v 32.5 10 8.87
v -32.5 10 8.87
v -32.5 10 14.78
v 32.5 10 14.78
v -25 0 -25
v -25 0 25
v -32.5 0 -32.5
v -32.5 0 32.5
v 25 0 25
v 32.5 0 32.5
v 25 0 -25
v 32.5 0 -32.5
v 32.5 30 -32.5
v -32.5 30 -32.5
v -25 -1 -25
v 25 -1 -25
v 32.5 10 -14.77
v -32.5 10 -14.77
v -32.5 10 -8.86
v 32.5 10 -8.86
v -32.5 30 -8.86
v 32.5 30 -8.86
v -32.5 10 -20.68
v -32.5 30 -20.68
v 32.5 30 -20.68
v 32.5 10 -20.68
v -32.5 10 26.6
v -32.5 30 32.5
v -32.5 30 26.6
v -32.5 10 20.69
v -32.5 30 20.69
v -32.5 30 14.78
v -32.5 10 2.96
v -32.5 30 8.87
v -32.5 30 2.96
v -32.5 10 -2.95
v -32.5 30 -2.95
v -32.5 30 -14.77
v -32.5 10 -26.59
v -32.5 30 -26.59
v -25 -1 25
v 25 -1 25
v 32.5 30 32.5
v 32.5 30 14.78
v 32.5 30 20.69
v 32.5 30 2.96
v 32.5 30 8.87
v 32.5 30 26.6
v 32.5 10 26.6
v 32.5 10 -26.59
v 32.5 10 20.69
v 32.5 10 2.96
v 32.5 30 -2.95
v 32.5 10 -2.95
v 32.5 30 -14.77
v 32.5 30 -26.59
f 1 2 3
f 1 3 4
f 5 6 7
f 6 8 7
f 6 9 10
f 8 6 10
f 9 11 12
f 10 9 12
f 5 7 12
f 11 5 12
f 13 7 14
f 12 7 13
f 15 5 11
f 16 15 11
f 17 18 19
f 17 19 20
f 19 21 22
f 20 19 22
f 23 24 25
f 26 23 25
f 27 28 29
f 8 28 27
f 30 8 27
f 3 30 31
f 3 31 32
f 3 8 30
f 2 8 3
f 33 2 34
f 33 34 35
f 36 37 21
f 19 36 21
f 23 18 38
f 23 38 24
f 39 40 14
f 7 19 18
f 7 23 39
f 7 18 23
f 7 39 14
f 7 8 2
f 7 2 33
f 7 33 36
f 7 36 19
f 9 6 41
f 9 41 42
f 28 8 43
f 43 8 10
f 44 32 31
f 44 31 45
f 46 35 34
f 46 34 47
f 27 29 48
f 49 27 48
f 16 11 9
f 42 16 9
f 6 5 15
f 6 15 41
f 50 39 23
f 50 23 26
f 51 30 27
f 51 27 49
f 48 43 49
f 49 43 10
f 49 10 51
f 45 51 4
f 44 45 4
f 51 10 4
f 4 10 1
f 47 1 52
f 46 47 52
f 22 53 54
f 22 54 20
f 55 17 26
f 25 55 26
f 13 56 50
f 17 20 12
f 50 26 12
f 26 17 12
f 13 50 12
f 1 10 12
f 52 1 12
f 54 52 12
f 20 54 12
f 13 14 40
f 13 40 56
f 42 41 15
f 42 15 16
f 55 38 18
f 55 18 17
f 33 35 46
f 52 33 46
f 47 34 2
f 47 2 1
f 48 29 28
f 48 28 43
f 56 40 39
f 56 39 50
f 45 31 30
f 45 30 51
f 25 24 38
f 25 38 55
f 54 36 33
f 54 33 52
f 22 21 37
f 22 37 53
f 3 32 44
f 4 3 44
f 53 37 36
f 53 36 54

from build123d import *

# Parameters (mm, degrees)
SKETCH1_W      = 65
SKETCH1_H      = 65
EXTRUDE1_DEPTH = 30
SKETCH2_W      = 65
SKETCH2_H      = 5.91
EXTRUDE2_DEPTH = 20
SKETCH3_W      = 50
SKETCH3_H      = 50
EXTRUDE3_DEPTH = 1


with BuildPart() as part:
    # Sketch1 → Extrude1 (new body)
    with BuildSketch(Plane(origin=(0, 0, 0), x_dir=(1, 0, 0), z_dir=(0, 1, 0))):
        Rectangle(SKETCH1_W, SKETCH1_H)
    extrude(amount=EXTRUDE1_DEPTH)

    # Sketch2 → Extrude2 (cut)
    with BuildSketch(Plane(origin=(0, 30, 0), x_dir=(1, 0, 0), z_dir=(0, 1, 0))):
        with Locations((0, 23.635)):
            Rectangle(SKETCH2_W, SKETCH2_H)
        with Locations((0, 11.815)):
            Rectangle(SKETCH2_W, SKETCH2_H)
        with Locations((0, -0.005)):
            Rectangle(SKETCH2_W, SKETCH2_H)
        with Locations((0, -11.825)):
            Rectangle(SKETCH2_W, SKETCH2_H)
        with Locations((0, -23.645)):
            Rectangle(SKETCH2_W, SKETCH2_H)
    extrude(amount=-EXTRUDE2_DEPTH, mode=Mode.SUBTRACT)

    # Sketch3 → Extrude3 (add)
    with BuildSketch(Plane.XZ):
        Rectangle(SKETCH3_W, SKETCH3_H)
    extrude(amount=EXTRUDE3_DEPTH)


solid = part.part
